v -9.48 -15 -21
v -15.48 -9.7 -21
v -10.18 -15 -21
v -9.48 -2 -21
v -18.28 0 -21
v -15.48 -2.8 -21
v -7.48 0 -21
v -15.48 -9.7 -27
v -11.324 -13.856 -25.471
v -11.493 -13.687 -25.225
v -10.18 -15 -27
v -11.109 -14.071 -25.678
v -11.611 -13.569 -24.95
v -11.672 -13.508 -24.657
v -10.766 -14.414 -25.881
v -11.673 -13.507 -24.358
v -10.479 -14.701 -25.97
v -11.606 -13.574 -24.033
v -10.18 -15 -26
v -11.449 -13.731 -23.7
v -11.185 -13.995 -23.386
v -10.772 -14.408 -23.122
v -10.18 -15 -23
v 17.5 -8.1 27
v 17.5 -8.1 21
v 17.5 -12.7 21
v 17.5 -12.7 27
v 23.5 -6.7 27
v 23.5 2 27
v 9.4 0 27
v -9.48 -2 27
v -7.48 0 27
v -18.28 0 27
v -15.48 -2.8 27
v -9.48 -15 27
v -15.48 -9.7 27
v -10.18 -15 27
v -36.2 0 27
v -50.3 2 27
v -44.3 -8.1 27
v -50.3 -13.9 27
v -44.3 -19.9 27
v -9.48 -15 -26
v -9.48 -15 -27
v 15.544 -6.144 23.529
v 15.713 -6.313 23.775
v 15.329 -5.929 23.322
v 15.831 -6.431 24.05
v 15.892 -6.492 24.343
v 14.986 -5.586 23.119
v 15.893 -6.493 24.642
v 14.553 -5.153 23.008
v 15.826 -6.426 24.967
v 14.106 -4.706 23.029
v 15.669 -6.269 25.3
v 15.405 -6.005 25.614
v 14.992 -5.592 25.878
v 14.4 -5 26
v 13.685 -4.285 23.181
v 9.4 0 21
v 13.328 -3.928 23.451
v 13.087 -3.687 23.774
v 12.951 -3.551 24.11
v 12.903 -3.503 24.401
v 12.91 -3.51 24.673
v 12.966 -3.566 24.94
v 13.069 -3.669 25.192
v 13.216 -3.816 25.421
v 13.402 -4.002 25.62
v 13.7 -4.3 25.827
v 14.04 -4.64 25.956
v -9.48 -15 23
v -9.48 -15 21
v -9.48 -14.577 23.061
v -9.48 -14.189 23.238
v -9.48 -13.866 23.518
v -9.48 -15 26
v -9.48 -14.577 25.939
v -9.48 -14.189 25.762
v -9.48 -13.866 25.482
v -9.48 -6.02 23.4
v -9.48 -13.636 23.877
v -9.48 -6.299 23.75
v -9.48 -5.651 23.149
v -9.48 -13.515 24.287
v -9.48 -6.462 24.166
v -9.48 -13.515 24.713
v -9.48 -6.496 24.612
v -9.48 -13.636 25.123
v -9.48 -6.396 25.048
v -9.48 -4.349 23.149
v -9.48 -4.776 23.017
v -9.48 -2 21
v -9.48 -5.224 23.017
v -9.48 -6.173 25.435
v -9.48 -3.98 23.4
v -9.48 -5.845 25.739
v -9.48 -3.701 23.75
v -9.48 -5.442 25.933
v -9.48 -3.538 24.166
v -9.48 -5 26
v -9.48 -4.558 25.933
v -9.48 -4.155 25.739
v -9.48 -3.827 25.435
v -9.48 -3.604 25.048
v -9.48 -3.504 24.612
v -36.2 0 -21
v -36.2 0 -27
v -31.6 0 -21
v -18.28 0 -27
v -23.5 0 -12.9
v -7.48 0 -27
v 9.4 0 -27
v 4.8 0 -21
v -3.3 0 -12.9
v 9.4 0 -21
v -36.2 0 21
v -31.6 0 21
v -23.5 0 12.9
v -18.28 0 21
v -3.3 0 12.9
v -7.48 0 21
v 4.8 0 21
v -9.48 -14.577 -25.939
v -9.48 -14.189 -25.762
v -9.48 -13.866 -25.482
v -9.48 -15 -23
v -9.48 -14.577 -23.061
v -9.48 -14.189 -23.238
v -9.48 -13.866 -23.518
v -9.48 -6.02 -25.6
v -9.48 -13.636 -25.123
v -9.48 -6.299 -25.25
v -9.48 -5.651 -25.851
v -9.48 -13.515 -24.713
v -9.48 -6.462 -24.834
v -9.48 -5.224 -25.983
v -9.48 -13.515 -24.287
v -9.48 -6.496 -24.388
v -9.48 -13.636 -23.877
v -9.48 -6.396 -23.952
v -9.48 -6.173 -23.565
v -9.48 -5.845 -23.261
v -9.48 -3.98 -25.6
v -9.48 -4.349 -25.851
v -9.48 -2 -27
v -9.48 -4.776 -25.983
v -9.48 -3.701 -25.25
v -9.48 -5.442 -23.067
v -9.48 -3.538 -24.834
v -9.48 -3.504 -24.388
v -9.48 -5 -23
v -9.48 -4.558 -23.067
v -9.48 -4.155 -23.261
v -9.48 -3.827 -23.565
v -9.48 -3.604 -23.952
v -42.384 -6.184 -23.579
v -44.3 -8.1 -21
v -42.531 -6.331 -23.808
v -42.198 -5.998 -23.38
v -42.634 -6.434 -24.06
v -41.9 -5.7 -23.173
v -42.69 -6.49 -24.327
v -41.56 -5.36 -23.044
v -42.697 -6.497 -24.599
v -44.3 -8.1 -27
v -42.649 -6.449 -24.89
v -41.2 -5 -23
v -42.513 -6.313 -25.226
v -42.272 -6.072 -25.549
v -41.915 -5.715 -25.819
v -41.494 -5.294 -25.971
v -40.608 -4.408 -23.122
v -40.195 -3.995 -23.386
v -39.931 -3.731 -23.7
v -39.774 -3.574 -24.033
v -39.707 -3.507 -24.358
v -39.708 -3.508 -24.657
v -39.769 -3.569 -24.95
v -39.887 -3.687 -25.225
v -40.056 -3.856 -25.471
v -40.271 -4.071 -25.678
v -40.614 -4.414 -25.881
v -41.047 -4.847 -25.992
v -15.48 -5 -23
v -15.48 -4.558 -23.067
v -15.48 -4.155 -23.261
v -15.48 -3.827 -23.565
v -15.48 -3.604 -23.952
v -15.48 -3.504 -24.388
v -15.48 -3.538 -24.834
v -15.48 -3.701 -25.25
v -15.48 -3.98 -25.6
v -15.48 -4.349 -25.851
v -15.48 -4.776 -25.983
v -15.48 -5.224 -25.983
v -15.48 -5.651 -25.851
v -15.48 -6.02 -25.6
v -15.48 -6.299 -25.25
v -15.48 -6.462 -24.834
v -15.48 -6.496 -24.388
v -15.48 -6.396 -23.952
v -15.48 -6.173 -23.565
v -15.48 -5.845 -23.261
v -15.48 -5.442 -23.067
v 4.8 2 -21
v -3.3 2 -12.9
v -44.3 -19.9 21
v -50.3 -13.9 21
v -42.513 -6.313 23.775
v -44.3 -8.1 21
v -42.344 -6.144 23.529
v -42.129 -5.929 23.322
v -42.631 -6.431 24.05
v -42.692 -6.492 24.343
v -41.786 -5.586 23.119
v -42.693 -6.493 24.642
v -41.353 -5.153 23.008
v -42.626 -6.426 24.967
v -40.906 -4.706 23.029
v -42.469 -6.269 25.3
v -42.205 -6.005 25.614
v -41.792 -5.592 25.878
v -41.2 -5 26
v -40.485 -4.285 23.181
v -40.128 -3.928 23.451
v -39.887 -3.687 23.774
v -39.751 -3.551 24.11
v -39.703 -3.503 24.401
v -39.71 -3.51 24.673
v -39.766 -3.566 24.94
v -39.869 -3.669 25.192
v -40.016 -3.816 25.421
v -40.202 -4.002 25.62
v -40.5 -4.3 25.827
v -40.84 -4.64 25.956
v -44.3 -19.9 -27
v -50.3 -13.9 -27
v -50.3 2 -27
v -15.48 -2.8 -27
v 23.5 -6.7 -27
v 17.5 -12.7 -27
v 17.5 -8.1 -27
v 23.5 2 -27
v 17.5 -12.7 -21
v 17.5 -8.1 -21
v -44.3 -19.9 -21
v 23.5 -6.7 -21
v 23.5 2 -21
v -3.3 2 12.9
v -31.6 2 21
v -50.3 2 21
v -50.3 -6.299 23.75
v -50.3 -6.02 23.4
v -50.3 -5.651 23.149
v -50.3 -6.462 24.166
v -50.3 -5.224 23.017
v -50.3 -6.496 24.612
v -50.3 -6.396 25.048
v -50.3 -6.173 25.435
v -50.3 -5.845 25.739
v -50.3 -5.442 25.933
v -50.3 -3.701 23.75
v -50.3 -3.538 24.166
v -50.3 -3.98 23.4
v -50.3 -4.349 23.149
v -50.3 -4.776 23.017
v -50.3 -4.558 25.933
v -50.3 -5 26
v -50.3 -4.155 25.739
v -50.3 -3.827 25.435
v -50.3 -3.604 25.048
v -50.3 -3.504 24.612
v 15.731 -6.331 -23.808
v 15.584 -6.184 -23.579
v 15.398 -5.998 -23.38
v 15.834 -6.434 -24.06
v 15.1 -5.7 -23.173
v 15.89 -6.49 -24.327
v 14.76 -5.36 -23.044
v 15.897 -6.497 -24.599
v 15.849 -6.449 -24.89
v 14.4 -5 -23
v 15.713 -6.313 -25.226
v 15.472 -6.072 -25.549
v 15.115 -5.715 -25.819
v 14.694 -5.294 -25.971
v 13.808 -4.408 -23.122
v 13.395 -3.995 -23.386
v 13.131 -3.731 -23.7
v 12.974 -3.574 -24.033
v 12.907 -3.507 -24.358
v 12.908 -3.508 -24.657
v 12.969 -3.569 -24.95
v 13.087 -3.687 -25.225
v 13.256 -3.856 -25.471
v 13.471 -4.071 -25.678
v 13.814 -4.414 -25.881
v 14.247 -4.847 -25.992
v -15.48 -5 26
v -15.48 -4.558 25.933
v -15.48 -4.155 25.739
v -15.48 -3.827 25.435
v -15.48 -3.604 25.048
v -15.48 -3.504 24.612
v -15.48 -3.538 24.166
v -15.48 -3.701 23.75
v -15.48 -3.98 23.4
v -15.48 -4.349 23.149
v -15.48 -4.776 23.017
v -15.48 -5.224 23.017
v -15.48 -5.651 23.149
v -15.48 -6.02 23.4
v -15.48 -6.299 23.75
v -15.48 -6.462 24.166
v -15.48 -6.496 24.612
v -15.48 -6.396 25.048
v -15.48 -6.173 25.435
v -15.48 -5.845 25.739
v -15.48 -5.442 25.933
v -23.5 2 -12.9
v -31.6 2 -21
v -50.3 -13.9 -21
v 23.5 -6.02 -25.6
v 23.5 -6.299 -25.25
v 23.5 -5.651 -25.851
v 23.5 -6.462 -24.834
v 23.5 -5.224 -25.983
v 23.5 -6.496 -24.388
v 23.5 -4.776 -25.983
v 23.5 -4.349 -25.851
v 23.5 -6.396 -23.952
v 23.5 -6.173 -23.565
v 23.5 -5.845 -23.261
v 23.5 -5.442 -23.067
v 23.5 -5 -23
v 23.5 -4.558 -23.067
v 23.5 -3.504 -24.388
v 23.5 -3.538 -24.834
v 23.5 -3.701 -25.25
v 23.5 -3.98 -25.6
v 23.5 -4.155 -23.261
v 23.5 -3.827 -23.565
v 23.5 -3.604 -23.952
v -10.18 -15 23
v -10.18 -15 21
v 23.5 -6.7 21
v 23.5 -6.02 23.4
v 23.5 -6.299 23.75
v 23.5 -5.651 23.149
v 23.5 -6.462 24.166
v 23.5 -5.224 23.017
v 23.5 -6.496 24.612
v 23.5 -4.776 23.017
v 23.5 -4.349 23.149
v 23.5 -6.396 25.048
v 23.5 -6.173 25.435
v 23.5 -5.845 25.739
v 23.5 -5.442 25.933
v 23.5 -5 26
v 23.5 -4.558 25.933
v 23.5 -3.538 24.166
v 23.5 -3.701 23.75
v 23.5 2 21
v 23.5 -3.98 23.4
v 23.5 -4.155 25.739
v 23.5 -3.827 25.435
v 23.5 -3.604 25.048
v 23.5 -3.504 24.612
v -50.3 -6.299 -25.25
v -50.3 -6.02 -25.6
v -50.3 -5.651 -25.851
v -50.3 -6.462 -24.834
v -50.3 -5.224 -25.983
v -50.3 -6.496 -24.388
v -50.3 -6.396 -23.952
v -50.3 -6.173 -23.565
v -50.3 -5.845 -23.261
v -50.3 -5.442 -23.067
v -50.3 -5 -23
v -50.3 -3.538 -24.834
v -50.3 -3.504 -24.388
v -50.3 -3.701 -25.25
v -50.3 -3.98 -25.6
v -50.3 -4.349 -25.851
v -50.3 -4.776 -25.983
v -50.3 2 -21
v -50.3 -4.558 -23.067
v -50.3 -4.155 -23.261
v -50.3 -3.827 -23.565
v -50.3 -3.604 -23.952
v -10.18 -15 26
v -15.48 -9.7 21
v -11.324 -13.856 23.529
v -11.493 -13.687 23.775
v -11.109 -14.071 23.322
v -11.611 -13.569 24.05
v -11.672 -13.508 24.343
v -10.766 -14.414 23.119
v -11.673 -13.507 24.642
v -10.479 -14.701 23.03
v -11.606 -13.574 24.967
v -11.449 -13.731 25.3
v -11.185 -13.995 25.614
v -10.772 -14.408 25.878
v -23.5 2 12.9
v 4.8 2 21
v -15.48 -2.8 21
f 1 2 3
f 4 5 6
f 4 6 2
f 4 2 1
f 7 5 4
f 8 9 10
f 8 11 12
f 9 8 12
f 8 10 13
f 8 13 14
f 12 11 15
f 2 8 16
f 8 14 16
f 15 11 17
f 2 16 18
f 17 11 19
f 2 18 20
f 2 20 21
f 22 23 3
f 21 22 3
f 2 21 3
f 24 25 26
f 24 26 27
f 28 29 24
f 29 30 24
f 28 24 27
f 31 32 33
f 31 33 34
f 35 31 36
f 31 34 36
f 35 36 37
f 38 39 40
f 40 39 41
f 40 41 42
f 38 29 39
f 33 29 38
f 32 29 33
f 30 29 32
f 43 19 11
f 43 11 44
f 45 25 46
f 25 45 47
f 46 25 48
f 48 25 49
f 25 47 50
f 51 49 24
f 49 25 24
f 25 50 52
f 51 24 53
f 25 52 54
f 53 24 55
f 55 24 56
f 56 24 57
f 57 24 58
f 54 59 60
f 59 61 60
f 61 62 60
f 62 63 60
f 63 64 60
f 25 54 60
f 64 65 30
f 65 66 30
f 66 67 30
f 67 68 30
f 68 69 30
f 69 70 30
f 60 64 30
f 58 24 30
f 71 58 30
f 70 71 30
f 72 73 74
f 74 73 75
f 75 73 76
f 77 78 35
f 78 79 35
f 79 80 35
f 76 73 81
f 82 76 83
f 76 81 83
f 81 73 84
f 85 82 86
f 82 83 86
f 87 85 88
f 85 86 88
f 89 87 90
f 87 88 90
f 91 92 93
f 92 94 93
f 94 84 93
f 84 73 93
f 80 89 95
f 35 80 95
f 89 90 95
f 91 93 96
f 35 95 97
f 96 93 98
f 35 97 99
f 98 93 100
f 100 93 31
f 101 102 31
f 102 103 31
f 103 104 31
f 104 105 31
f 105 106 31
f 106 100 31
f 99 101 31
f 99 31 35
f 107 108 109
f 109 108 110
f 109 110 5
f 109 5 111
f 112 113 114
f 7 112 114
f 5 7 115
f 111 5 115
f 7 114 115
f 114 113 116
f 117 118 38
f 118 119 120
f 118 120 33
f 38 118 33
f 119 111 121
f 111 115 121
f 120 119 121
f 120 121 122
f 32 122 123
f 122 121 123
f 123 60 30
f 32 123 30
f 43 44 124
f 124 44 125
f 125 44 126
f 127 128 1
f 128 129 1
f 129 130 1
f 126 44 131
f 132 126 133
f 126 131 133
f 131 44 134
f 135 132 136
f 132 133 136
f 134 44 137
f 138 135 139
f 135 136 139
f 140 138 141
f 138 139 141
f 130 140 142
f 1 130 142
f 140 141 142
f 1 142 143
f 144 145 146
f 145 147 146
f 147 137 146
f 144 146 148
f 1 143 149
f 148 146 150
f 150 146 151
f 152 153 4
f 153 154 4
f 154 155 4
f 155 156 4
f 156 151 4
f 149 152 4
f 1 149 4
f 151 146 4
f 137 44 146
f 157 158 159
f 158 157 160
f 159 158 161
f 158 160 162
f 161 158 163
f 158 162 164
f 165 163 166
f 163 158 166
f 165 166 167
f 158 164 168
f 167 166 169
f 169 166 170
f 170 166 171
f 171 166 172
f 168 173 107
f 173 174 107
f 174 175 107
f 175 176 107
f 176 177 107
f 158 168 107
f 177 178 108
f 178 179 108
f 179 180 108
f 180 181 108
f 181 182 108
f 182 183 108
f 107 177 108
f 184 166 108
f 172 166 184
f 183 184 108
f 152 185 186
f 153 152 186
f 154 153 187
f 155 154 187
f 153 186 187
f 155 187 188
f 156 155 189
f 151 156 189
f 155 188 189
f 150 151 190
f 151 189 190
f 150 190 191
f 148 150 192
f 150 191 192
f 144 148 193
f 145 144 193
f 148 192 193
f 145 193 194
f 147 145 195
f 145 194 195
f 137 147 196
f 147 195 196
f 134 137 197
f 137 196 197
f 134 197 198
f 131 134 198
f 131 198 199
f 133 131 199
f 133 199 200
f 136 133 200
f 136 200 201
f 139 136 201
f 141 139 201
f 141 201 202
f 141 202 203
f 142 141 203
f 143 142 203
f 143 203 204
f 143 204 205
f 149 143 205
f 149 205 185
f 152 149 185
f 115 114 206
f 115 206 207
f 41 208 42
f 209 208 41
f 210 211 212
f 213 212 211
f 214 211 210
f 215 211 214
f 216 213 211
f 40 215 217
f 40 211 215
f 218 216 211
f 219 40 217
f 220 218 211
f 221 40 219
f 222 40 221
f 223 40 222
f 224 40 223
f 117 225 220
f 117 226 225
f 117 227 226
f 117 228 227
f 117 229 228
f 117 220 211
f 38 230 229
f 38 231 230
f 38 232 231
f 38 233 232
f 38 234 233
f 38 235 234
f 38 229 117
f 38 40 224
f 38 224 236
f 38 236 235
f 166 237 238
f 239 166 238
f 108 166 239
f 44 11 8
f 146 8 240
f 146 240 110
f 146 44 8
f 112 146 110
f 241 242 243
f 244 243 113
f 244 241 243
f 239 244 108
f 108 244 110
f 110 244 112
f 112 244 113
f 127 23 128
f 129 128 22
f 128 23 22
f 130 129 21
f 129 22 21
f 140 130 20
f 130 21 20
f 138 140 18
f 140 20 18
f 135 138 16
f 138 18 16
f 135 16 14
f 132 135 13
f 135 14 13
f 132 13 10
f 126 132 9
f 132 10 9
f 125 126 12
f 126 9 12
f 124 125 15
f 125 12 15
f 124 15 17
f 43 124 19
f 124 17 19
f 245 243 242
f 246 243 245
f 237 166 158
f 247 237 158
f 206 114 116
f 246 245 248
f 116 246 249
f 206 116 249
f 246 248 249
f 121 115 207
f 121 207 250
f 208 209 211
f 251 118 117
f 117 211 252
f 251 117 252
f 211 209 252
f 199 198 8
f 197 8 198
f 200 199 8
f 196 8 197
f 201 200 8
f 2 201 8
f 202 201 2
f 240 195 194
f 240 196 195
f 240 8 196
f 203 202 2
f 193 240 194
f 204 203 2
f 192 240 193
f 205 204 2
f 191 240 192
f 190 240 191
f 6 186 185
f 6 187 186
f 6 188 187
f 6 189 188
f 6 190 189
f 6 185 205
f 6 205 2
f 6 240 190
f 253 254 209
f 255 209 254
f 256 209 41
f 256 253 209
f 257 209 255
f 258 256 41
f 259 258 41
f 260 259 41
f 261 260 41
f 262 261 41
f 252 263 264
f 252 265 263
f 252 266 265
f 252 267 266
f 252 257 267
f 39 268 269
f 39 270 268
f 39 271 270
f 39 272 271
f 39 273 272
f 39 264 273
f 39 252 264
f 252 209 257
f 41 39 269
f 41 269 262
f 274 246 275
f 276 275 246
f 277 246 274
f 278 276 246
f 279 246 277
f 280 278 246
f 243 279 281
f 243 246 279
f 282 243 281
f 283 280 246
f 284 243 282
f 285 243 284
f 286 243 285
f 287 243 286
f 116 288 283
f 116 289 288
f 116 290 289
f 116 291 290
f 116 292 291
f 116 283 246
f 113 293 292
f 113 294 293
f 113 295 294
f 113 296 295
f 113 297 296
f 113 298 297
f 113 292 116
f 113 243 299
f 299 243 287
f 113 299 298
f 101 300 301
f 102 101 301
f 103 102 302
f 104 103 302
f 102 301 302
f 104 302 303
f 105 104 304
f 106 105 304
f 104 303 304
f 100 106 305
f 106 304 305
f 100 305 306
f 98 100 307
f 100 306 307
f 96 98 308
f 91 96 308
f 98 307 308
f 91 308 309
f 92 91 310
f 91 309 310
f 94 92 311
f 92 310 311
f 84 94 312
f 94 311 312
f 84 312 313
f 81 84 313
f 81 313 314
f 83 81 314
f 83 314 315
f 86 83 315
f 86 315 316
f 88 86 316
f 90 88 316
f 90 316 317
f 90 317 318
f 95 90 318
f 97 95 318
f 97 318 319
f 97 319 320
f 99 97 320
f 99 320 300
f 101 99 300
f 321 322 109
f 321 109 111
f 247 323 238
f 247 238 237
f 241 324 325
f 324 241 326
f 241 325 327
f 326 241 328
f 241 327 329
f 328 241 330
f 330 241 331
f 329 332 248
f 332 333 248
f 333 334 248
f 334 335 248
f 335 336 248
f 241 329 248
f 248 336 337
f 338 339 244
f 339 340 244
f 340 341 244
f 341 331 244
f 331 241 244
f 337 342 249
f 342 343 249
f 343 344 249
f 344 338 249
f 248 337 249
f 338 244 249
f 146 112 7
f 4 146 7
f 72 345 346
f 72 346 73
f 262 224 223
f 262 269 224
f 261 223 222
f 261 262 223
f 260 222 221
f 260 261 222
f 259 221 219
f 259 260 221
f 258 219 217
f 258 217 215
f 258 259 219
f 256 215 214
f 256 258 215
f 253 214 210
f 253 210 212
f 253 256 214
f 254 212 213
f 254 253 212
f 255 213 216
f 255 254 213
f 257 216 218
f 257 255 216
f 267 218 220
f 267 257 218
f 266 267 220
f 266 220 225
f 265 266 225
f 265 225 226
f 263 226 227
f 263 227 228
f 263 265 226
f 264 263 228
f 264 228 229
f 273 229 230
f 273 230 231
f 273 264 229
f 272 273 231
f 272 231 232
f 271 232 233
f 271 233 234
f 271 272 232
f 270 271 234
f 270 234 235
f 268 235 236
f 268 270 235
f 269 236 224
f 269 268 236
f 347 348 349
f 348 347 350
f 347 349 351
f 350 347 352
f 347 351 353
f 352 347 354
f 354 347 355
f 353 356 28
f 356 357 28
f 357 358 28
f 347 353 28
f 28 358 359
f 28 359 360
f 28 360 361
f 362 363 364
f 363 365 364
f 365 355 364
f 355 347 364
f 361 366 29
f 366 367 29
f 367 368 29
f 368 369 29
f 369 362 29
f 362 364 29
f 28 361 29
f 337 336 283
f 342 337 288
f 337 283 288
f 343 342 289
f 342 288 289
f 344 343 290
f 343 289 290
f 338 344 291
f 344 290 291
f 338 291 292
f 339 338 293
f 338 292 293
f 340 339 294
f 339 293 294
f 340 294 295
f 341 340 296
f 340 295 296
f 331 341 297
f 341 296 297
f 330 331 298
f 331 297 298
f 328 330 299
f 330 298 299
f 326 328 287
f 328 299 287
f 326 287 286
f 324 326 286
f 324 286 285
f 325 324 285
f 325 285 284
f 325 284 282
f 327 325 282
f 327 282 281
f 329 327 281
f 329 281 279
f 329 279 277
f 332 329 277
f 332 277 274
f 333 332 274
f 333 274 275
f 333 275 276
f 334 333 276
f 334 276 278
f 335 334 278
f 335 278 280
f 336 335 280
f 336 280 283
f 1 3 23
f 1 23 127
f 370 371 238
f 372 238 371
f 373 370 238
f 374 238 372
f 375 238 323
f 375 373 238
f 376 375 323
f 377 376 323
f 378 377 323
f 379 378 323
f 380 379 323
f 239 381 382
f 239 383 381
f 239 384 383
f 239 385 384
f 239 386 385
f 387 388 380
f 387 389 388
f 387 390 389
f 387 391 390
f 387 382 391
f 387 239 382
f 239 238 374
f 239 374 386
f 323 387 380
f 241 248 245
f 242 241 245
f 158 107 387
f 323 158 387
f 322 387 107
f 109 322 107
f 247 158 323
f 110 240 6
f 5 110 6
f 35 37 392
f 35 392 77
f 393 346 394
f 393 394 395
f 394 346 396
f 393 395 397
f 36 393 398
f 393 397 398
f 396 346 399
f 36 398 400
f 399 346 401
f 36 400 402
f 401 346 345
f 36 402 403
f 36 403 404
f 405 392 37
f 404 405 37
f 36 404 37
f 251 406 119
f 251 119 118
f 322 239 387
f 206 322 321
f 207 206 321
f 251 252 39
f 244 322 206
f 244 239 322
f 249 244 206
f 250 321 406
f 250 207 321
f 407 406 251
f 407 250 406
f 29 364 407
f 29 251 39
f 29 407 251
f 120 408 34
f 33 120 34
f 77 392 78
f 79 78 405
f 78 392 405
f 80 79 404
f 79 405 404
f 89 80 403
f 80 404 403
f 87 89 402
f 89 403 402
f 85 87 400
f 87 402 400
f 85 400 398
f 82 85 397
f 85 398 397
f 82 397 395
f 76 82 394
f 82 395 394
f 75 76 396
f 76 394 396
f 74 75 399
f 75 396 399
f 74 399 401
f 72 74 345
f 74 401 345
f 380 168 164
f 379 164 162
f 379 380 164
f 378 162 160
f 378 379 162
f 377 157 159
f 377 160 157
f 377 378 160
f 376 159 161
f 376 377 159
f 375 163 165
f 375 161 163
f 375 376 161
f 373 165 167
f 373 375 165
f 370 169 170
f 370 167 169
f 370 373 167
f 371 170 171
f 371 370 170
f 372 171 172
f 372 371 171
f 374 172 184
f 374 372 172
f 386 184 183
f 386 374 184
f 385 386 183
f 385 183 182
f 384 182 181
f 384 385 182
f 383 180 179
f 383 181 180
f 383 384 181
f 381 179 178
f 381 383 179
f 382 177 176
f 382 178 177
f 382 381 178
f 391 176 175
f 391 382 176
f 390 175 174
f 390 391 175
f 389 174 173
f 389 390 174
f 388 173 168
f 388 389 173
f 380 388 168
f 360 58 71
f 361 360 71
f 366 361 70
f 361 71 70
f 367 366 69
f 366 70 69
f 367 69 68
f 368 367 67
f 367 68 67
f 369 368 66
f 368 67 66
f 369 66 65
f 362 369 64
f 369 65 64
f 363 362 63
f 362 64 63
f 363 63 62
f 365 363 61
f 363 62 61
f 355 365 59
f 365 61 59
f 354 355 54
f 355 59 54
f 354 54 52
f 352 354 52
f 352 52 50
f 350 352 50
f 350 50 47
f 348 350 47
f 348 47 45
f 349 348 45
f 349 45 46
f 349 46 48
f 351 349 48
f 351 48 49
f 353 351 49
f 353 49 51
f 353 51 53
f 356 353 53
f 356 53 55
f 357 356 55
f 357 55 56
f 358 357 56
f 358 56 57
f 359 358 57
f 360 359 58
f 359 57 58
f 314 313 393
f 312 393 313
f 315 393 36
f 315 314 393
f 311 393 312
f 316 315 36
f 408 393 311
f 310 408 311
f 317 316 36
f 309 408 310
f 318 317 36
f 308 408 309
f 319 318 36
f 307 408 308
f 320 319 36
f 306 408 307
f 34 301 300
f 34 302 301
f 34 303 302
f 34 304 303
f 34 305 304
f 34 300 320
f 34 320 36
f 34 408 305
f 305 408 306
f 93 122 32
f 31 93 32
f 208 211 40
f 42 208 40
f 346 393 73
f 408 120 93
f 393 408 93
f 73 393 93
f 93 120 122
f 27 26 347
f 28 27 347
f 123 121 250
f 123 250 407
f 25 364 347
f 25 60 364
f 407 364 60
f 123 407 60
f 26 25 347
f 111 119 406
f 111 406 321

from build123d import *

# Parameters (mm, degrees)
SKETCH1_W               = 47
SKETCH1_H               = 54
BOSS_EXTRUDE1_DEPTH     = 2
SKETCH2_W               = 6
SKETCH2_H               = 6
BOSS_EXTRUDE2_DEPTH     = 15
CHAMFER1_SIZE           = 5.3
CHAMFER2_SIZE           = 8.3
SKETCH3_R               = 1.5
CUT_EXTRUDE1_DEPTH      = 50.733694815
CHAMFER3_SIZE           = 2.8
CHAMFER4_SIZE           = 2
SKETCH4_W               = 6
SKETCH4_H               = 2
BOSS_EXTRUDE3_DEPTH     = 26.8
SKETCH6_W               = 6
SKETCH6_H               = 6
BOSS_EXTRUDE4_DEPTH     = 22
CHAMFER5_SIZE           = 8.1
CUT_EXTRUDE2_DEPTH      = 61.457423035
CHAMFER6_SIZE           = 8.1
CUT_EXTRUDE3_DEPTH      = 53.832588428
CUT_EXTRUDE3_DEPTH_BACK = 53.832588428
SKETCH8_R               = 1.5


with BuildPart() as part:
    # Sketch1 → Boss-Extrude1 (new body)
    with BuildSketch(Plane(origin=(0, 0, 0), x_dir=(1, 0, 0), z_dir=(0, 1, 0))):
        Rectangle(SKETCH1_W, SKETCH1_H)
    extrude(amount=BOSS_EXTRUDE1_DEPTH)

    # Sketch2 → Boss-Extrude2 (add)
    with BuildSketch(Plane.XZ):
        with Locations((-12.48, 24)):
            Rectangle(SKETCH2_W, SKETCH2_H)
        with Locations((20.5, 24)):
            Rectangle(SKETCH2_W, SKETCH2_H)
        with Locations((20.5, -24)):
            Rectangle(SKETCH2_W, SKETCH2_H)
        with Locations((-12.48, -24)):
            Rectangle(SKETCH2_W, SKETCH2_H)
    extrude(amount=BOSS_EXTRUDE2_DEPTH)

    # Chamfer1
    chamfer1_edges = [part.edges().sort_by_distance(p)[0] for p in [
        (-15.48, -15, 24),
        (-15.48, -15, -24),
    ]]
    chamfer(chamfer1_edges, length=CHAMFER1_SIZE)

    # Chamfer2
    # the kernel refuses this chamfer: 8.3 mm, written as the material it takes off along each edge
    with BuildSketch(Plane(origin=(23.5, -15, 0.3449688), x_dir=(0.027495876610586414, 0.9996219169112966, 0), z_dir=(0, 0, -1)), Plane(origin=(23.5, -15, -0.3449688), x_dir=(-0.9996219169112969, -0.027495876610586417, 0), z_dir=(0, 0, 1))) as chamfer2_piece_1:
        Polygon((CHAMFER2_SIZE * 0.999621916911, -CHAMFER2_SIZE * 0.0274958766106), (-CHAMFER2_SIZE * 0.0274958766106, -CHAMFER2_SIZE * 0.999621916911), (0, 0), align=None)
    extrude(amount=48.6899376, mode=Mode.SUBTRACT)

    # Sketch3 → Cut-Extrude1 (cut, through all)
    with BuildSketch(Plane.ZY.offset(15.48)):
        with Locations((24.5, -5)):
            Circle(SKETCH3_R)
        with Locations((-24.5, -5)):
            Circle(SKETCH3_R)
        with Locations((24.5, -15)):
            Circle(SKETCH3_R)
        with Locations((-24.5, -15)):
            Circle(SKETCH3_R)
    extrude(amount=-CUT_EXTRUDE1_DEPTH, mode=Mode.SUBTRACT)

    # Chamfer3
    chamfer3_edges = [part.edges().sort_by_distance(p)[0] for p in [
        (-15.48, 0, 24),
        (-15.48, 0, -24),
    ]]
    chamfer(chamfer3_edges, length=CHAMFER3_SIZE)

    # Chamfer4
    chamfer4_edges = [part.edges().sort_by_distance(p)[0] for p in [
        (-9.48, 0, 24),
        (-9.48, 0, -24),
    ]]
    chamfer(chamfer4_edges, length=CHAMFER4_SIZE)

    # Sketch4 → Boss-Extrude3 (add)
    with BuildSketch(Plane.ZY.offset(23.5)):
        with Locations((24, 1)):
            Rectangle(SKETCH4_W, SKETCH4_H)
        with Locations((-24, 1)):
            Rectangle(SKETCH4_W, SKETCH4_H)
    extrude(amount=BOSS_EXTRUDE3_DEPTH)

    # Sketch6 → Boss-Extrude4 (add)
    with BuildSketch(Plane.XZ):
        with Locations((-47.3, 24)):
            Rectangle(SKETCH6_W, SKETCH6_H)
        with Locations((-47.3, -24)):
            Rectangle(SKETCH6_W, SKETCH6_H)
    extrude(amount=BOSS_EXTRUDE4_DEPTH)

    # Chamfer5
    # the kernel refuses this chamfer: 8.1 mm, written as the material it adds along each edge
    with BuildSketch(Plane(origin=(-23.5, 2, 21), x_dir=(0.027495876610586174, 0, -0.9996219169112968), z_dir=(0, -1, 0)), Plane(origin=(-23.5, 2, -21), x_dir=(-0.9996219169112968, 0, -0.02749587661058618), z_dir=(0, -1, 0))) as chamfer5_piece_1:
        Polygon((CHAMFER5_SIZE * 0.999621916911, -CHAMFER5_SIZE * 0.0274958766106), (-CHAMFER5_SIZE * 0.0274958766106, -CHAMFER5_SIZE * 0.999621916911), (0, 0), align=None)
    extrude(amount=2)
    with BuildSketch(Plane(origin=(-44.3, 0, 27), x_dir=(-0.027495876610586608, -0.9996219169112968, 0), z_dir=(0, 0, -1))) as chamfer5_piece_2:
        Polygon((CHAMFER5_SIZE * 0.999621916911, -CHAMFER5_SIZE * 0.0274958766106), (-CHAMFER5_SIZE * 0.0274958766106, -CHAMFER5_SIZE * 0.999621916911), (0, 0), align=None)
    extrude(amount=6)
    with BuildSketch(Plane(origin=(-44.3, 0, -27), x_dir=(-0.027495876610586608, -0.9996219169112968, 0), z_dir=(0, 0, 1))) as chamfer5_piece_3:
        Polygon((CHAMFER5_SIZE * 0.999621916911, CHAMFER5_SIZE * 0.0274958766106), (-CHAMFER5_SIZE * 0.0274958766106, CHAMFER5_SIZE * 0.999621916911), (0, 0), align=None)
    extrude(amount=6)
    # the kernel refuses this chamfer: 8.1 mm, written as the material it takes off along each edge
    with BuildSketch(Plane(origin=(-50.3, -22, 0.169367797), x_dir=(0.9996219169112968, -0.027495876610586167, 0), z_dir=(0, 0, 1)), Plane(origin=(-50.3, -22, -0.169367797), x_dir=(-0.027495876610586608, 0.9996219169112968, 0), z_dir=(0, 0, -1))) as chamfer5_2_piece_1:
        Polygon((CHAMFER5_SIZE * 0.999621916911, CHAMFER5_SIZE * 0.0274958766106), (-CHAMFER5_SIZE * 0.0274958766106, CHAMFER5_SIZE * 0.999621916911), (0, 0), align=None)
    extrude(amount=47.661264405, mode=Mode.SUBTRACT)

    # Sketch7 → Cut-Extrude2 (cut, through all)
    with BuildSketch(Plane.XZ):
        Polygon((9.4, 21), (17.5, 21), (23.5, 21), (23.5, -21), (17.5, -21), (9.4, -21), (4.8, -21), (-3.3, -12.9), (-3.3, 12.9), (4.8, 21), align=None)
    extrude(amount=-CUT_EXTRUDE2_DEPTH, mode=Mode.SUBTRACT)

    # Chamfer6
    # the kernel refuses this chamfer: 8.1 mm, written as the material it adds along each edge
    with BuildSketch(Plane(origin=(17.5, 0, 27), x_dir=(0.02749587661058618, -0.9996219169112968, 0), z_dir=(0, 0, -1))) as chamfer6_piece_1_section:
        Polygon((CHAMFER6_SIZE * 0.999621916911, CHAMFER6_SIZE * 0.0274958766106), (-CHAMFER6_SIZE * 0.0274958766106, CHAMFER6_SIZE * 0.999621916911), (0, 0), align=None)
    chamfer6_piece_1 = extrude(amount=6, mode=Mode.PRIVATE)
    chamfer6_piece_1 = chamfer6_piece_1 - Plane(origin=(14.692276243, -5, 24.5), x_dir=(0, 0, 1), z_dir=(-1, 0, 0)) * Cylinder(1.5, 45, mode=Mode.PRIVATE)
    add(chamfer6_piece_1)
    with BuildSketch(Plane(origin=(17.5, 0, -27), x_dir=(0.02749587661058618, -0.9996219169112968, 0), z_dir=(0, 0, 1))) as chamfer6_piece_2_section:
        Polygon((CHAMFER6_SIZE * 0.999621916911, -CHAMFER6_SIZE * 0.0274958766106), (-CHAMFER6_SIZE * 0.0274958766106, -CHAMFER6_SIZE * 0.999621916911), (0, 0), align=None)
    chamfer6_piece_2 = extrude(amount=6, mode=Mode.PRIVATE)
    chamfer6_piece_2 = chamfer6_piece_2 - Plane(origin=(14.692276222, -5, -24.5), x_dir=(0, 0, 1), z_dir=(-1, 0, 0)) * Cylinder(1.5, 45, mode=Mode.PRIVATE)
    add(chamfer6_piece_2)

    # Sketch8 → Cut-Extrude3 (cut, two sides: drawn at the far end of the back side and taken through both)
    with BuildSketch(Plane(origin=(-9.48, 0, 0), x_dir=(0, 0, -1), z_dir=(1, 0, 0)).offset(-CUT_EXTRUDE3_DEPTH_BACK)):
        with Locations(Location((-24.5, -5, 0), (0, 0, 180))):
            Circle(SKETCH8_R)
        with Locations(Location((24.5, -5, 0), (0, 0, 180))):
            Circle(SKETCH8_R)
    extrude(amount=CUT_EXTRUDE3_DEPTH + CUT_EXTRUDE3_DEPTH_BACK, mode=Mode.SUBTRACT)


solid = part.part
